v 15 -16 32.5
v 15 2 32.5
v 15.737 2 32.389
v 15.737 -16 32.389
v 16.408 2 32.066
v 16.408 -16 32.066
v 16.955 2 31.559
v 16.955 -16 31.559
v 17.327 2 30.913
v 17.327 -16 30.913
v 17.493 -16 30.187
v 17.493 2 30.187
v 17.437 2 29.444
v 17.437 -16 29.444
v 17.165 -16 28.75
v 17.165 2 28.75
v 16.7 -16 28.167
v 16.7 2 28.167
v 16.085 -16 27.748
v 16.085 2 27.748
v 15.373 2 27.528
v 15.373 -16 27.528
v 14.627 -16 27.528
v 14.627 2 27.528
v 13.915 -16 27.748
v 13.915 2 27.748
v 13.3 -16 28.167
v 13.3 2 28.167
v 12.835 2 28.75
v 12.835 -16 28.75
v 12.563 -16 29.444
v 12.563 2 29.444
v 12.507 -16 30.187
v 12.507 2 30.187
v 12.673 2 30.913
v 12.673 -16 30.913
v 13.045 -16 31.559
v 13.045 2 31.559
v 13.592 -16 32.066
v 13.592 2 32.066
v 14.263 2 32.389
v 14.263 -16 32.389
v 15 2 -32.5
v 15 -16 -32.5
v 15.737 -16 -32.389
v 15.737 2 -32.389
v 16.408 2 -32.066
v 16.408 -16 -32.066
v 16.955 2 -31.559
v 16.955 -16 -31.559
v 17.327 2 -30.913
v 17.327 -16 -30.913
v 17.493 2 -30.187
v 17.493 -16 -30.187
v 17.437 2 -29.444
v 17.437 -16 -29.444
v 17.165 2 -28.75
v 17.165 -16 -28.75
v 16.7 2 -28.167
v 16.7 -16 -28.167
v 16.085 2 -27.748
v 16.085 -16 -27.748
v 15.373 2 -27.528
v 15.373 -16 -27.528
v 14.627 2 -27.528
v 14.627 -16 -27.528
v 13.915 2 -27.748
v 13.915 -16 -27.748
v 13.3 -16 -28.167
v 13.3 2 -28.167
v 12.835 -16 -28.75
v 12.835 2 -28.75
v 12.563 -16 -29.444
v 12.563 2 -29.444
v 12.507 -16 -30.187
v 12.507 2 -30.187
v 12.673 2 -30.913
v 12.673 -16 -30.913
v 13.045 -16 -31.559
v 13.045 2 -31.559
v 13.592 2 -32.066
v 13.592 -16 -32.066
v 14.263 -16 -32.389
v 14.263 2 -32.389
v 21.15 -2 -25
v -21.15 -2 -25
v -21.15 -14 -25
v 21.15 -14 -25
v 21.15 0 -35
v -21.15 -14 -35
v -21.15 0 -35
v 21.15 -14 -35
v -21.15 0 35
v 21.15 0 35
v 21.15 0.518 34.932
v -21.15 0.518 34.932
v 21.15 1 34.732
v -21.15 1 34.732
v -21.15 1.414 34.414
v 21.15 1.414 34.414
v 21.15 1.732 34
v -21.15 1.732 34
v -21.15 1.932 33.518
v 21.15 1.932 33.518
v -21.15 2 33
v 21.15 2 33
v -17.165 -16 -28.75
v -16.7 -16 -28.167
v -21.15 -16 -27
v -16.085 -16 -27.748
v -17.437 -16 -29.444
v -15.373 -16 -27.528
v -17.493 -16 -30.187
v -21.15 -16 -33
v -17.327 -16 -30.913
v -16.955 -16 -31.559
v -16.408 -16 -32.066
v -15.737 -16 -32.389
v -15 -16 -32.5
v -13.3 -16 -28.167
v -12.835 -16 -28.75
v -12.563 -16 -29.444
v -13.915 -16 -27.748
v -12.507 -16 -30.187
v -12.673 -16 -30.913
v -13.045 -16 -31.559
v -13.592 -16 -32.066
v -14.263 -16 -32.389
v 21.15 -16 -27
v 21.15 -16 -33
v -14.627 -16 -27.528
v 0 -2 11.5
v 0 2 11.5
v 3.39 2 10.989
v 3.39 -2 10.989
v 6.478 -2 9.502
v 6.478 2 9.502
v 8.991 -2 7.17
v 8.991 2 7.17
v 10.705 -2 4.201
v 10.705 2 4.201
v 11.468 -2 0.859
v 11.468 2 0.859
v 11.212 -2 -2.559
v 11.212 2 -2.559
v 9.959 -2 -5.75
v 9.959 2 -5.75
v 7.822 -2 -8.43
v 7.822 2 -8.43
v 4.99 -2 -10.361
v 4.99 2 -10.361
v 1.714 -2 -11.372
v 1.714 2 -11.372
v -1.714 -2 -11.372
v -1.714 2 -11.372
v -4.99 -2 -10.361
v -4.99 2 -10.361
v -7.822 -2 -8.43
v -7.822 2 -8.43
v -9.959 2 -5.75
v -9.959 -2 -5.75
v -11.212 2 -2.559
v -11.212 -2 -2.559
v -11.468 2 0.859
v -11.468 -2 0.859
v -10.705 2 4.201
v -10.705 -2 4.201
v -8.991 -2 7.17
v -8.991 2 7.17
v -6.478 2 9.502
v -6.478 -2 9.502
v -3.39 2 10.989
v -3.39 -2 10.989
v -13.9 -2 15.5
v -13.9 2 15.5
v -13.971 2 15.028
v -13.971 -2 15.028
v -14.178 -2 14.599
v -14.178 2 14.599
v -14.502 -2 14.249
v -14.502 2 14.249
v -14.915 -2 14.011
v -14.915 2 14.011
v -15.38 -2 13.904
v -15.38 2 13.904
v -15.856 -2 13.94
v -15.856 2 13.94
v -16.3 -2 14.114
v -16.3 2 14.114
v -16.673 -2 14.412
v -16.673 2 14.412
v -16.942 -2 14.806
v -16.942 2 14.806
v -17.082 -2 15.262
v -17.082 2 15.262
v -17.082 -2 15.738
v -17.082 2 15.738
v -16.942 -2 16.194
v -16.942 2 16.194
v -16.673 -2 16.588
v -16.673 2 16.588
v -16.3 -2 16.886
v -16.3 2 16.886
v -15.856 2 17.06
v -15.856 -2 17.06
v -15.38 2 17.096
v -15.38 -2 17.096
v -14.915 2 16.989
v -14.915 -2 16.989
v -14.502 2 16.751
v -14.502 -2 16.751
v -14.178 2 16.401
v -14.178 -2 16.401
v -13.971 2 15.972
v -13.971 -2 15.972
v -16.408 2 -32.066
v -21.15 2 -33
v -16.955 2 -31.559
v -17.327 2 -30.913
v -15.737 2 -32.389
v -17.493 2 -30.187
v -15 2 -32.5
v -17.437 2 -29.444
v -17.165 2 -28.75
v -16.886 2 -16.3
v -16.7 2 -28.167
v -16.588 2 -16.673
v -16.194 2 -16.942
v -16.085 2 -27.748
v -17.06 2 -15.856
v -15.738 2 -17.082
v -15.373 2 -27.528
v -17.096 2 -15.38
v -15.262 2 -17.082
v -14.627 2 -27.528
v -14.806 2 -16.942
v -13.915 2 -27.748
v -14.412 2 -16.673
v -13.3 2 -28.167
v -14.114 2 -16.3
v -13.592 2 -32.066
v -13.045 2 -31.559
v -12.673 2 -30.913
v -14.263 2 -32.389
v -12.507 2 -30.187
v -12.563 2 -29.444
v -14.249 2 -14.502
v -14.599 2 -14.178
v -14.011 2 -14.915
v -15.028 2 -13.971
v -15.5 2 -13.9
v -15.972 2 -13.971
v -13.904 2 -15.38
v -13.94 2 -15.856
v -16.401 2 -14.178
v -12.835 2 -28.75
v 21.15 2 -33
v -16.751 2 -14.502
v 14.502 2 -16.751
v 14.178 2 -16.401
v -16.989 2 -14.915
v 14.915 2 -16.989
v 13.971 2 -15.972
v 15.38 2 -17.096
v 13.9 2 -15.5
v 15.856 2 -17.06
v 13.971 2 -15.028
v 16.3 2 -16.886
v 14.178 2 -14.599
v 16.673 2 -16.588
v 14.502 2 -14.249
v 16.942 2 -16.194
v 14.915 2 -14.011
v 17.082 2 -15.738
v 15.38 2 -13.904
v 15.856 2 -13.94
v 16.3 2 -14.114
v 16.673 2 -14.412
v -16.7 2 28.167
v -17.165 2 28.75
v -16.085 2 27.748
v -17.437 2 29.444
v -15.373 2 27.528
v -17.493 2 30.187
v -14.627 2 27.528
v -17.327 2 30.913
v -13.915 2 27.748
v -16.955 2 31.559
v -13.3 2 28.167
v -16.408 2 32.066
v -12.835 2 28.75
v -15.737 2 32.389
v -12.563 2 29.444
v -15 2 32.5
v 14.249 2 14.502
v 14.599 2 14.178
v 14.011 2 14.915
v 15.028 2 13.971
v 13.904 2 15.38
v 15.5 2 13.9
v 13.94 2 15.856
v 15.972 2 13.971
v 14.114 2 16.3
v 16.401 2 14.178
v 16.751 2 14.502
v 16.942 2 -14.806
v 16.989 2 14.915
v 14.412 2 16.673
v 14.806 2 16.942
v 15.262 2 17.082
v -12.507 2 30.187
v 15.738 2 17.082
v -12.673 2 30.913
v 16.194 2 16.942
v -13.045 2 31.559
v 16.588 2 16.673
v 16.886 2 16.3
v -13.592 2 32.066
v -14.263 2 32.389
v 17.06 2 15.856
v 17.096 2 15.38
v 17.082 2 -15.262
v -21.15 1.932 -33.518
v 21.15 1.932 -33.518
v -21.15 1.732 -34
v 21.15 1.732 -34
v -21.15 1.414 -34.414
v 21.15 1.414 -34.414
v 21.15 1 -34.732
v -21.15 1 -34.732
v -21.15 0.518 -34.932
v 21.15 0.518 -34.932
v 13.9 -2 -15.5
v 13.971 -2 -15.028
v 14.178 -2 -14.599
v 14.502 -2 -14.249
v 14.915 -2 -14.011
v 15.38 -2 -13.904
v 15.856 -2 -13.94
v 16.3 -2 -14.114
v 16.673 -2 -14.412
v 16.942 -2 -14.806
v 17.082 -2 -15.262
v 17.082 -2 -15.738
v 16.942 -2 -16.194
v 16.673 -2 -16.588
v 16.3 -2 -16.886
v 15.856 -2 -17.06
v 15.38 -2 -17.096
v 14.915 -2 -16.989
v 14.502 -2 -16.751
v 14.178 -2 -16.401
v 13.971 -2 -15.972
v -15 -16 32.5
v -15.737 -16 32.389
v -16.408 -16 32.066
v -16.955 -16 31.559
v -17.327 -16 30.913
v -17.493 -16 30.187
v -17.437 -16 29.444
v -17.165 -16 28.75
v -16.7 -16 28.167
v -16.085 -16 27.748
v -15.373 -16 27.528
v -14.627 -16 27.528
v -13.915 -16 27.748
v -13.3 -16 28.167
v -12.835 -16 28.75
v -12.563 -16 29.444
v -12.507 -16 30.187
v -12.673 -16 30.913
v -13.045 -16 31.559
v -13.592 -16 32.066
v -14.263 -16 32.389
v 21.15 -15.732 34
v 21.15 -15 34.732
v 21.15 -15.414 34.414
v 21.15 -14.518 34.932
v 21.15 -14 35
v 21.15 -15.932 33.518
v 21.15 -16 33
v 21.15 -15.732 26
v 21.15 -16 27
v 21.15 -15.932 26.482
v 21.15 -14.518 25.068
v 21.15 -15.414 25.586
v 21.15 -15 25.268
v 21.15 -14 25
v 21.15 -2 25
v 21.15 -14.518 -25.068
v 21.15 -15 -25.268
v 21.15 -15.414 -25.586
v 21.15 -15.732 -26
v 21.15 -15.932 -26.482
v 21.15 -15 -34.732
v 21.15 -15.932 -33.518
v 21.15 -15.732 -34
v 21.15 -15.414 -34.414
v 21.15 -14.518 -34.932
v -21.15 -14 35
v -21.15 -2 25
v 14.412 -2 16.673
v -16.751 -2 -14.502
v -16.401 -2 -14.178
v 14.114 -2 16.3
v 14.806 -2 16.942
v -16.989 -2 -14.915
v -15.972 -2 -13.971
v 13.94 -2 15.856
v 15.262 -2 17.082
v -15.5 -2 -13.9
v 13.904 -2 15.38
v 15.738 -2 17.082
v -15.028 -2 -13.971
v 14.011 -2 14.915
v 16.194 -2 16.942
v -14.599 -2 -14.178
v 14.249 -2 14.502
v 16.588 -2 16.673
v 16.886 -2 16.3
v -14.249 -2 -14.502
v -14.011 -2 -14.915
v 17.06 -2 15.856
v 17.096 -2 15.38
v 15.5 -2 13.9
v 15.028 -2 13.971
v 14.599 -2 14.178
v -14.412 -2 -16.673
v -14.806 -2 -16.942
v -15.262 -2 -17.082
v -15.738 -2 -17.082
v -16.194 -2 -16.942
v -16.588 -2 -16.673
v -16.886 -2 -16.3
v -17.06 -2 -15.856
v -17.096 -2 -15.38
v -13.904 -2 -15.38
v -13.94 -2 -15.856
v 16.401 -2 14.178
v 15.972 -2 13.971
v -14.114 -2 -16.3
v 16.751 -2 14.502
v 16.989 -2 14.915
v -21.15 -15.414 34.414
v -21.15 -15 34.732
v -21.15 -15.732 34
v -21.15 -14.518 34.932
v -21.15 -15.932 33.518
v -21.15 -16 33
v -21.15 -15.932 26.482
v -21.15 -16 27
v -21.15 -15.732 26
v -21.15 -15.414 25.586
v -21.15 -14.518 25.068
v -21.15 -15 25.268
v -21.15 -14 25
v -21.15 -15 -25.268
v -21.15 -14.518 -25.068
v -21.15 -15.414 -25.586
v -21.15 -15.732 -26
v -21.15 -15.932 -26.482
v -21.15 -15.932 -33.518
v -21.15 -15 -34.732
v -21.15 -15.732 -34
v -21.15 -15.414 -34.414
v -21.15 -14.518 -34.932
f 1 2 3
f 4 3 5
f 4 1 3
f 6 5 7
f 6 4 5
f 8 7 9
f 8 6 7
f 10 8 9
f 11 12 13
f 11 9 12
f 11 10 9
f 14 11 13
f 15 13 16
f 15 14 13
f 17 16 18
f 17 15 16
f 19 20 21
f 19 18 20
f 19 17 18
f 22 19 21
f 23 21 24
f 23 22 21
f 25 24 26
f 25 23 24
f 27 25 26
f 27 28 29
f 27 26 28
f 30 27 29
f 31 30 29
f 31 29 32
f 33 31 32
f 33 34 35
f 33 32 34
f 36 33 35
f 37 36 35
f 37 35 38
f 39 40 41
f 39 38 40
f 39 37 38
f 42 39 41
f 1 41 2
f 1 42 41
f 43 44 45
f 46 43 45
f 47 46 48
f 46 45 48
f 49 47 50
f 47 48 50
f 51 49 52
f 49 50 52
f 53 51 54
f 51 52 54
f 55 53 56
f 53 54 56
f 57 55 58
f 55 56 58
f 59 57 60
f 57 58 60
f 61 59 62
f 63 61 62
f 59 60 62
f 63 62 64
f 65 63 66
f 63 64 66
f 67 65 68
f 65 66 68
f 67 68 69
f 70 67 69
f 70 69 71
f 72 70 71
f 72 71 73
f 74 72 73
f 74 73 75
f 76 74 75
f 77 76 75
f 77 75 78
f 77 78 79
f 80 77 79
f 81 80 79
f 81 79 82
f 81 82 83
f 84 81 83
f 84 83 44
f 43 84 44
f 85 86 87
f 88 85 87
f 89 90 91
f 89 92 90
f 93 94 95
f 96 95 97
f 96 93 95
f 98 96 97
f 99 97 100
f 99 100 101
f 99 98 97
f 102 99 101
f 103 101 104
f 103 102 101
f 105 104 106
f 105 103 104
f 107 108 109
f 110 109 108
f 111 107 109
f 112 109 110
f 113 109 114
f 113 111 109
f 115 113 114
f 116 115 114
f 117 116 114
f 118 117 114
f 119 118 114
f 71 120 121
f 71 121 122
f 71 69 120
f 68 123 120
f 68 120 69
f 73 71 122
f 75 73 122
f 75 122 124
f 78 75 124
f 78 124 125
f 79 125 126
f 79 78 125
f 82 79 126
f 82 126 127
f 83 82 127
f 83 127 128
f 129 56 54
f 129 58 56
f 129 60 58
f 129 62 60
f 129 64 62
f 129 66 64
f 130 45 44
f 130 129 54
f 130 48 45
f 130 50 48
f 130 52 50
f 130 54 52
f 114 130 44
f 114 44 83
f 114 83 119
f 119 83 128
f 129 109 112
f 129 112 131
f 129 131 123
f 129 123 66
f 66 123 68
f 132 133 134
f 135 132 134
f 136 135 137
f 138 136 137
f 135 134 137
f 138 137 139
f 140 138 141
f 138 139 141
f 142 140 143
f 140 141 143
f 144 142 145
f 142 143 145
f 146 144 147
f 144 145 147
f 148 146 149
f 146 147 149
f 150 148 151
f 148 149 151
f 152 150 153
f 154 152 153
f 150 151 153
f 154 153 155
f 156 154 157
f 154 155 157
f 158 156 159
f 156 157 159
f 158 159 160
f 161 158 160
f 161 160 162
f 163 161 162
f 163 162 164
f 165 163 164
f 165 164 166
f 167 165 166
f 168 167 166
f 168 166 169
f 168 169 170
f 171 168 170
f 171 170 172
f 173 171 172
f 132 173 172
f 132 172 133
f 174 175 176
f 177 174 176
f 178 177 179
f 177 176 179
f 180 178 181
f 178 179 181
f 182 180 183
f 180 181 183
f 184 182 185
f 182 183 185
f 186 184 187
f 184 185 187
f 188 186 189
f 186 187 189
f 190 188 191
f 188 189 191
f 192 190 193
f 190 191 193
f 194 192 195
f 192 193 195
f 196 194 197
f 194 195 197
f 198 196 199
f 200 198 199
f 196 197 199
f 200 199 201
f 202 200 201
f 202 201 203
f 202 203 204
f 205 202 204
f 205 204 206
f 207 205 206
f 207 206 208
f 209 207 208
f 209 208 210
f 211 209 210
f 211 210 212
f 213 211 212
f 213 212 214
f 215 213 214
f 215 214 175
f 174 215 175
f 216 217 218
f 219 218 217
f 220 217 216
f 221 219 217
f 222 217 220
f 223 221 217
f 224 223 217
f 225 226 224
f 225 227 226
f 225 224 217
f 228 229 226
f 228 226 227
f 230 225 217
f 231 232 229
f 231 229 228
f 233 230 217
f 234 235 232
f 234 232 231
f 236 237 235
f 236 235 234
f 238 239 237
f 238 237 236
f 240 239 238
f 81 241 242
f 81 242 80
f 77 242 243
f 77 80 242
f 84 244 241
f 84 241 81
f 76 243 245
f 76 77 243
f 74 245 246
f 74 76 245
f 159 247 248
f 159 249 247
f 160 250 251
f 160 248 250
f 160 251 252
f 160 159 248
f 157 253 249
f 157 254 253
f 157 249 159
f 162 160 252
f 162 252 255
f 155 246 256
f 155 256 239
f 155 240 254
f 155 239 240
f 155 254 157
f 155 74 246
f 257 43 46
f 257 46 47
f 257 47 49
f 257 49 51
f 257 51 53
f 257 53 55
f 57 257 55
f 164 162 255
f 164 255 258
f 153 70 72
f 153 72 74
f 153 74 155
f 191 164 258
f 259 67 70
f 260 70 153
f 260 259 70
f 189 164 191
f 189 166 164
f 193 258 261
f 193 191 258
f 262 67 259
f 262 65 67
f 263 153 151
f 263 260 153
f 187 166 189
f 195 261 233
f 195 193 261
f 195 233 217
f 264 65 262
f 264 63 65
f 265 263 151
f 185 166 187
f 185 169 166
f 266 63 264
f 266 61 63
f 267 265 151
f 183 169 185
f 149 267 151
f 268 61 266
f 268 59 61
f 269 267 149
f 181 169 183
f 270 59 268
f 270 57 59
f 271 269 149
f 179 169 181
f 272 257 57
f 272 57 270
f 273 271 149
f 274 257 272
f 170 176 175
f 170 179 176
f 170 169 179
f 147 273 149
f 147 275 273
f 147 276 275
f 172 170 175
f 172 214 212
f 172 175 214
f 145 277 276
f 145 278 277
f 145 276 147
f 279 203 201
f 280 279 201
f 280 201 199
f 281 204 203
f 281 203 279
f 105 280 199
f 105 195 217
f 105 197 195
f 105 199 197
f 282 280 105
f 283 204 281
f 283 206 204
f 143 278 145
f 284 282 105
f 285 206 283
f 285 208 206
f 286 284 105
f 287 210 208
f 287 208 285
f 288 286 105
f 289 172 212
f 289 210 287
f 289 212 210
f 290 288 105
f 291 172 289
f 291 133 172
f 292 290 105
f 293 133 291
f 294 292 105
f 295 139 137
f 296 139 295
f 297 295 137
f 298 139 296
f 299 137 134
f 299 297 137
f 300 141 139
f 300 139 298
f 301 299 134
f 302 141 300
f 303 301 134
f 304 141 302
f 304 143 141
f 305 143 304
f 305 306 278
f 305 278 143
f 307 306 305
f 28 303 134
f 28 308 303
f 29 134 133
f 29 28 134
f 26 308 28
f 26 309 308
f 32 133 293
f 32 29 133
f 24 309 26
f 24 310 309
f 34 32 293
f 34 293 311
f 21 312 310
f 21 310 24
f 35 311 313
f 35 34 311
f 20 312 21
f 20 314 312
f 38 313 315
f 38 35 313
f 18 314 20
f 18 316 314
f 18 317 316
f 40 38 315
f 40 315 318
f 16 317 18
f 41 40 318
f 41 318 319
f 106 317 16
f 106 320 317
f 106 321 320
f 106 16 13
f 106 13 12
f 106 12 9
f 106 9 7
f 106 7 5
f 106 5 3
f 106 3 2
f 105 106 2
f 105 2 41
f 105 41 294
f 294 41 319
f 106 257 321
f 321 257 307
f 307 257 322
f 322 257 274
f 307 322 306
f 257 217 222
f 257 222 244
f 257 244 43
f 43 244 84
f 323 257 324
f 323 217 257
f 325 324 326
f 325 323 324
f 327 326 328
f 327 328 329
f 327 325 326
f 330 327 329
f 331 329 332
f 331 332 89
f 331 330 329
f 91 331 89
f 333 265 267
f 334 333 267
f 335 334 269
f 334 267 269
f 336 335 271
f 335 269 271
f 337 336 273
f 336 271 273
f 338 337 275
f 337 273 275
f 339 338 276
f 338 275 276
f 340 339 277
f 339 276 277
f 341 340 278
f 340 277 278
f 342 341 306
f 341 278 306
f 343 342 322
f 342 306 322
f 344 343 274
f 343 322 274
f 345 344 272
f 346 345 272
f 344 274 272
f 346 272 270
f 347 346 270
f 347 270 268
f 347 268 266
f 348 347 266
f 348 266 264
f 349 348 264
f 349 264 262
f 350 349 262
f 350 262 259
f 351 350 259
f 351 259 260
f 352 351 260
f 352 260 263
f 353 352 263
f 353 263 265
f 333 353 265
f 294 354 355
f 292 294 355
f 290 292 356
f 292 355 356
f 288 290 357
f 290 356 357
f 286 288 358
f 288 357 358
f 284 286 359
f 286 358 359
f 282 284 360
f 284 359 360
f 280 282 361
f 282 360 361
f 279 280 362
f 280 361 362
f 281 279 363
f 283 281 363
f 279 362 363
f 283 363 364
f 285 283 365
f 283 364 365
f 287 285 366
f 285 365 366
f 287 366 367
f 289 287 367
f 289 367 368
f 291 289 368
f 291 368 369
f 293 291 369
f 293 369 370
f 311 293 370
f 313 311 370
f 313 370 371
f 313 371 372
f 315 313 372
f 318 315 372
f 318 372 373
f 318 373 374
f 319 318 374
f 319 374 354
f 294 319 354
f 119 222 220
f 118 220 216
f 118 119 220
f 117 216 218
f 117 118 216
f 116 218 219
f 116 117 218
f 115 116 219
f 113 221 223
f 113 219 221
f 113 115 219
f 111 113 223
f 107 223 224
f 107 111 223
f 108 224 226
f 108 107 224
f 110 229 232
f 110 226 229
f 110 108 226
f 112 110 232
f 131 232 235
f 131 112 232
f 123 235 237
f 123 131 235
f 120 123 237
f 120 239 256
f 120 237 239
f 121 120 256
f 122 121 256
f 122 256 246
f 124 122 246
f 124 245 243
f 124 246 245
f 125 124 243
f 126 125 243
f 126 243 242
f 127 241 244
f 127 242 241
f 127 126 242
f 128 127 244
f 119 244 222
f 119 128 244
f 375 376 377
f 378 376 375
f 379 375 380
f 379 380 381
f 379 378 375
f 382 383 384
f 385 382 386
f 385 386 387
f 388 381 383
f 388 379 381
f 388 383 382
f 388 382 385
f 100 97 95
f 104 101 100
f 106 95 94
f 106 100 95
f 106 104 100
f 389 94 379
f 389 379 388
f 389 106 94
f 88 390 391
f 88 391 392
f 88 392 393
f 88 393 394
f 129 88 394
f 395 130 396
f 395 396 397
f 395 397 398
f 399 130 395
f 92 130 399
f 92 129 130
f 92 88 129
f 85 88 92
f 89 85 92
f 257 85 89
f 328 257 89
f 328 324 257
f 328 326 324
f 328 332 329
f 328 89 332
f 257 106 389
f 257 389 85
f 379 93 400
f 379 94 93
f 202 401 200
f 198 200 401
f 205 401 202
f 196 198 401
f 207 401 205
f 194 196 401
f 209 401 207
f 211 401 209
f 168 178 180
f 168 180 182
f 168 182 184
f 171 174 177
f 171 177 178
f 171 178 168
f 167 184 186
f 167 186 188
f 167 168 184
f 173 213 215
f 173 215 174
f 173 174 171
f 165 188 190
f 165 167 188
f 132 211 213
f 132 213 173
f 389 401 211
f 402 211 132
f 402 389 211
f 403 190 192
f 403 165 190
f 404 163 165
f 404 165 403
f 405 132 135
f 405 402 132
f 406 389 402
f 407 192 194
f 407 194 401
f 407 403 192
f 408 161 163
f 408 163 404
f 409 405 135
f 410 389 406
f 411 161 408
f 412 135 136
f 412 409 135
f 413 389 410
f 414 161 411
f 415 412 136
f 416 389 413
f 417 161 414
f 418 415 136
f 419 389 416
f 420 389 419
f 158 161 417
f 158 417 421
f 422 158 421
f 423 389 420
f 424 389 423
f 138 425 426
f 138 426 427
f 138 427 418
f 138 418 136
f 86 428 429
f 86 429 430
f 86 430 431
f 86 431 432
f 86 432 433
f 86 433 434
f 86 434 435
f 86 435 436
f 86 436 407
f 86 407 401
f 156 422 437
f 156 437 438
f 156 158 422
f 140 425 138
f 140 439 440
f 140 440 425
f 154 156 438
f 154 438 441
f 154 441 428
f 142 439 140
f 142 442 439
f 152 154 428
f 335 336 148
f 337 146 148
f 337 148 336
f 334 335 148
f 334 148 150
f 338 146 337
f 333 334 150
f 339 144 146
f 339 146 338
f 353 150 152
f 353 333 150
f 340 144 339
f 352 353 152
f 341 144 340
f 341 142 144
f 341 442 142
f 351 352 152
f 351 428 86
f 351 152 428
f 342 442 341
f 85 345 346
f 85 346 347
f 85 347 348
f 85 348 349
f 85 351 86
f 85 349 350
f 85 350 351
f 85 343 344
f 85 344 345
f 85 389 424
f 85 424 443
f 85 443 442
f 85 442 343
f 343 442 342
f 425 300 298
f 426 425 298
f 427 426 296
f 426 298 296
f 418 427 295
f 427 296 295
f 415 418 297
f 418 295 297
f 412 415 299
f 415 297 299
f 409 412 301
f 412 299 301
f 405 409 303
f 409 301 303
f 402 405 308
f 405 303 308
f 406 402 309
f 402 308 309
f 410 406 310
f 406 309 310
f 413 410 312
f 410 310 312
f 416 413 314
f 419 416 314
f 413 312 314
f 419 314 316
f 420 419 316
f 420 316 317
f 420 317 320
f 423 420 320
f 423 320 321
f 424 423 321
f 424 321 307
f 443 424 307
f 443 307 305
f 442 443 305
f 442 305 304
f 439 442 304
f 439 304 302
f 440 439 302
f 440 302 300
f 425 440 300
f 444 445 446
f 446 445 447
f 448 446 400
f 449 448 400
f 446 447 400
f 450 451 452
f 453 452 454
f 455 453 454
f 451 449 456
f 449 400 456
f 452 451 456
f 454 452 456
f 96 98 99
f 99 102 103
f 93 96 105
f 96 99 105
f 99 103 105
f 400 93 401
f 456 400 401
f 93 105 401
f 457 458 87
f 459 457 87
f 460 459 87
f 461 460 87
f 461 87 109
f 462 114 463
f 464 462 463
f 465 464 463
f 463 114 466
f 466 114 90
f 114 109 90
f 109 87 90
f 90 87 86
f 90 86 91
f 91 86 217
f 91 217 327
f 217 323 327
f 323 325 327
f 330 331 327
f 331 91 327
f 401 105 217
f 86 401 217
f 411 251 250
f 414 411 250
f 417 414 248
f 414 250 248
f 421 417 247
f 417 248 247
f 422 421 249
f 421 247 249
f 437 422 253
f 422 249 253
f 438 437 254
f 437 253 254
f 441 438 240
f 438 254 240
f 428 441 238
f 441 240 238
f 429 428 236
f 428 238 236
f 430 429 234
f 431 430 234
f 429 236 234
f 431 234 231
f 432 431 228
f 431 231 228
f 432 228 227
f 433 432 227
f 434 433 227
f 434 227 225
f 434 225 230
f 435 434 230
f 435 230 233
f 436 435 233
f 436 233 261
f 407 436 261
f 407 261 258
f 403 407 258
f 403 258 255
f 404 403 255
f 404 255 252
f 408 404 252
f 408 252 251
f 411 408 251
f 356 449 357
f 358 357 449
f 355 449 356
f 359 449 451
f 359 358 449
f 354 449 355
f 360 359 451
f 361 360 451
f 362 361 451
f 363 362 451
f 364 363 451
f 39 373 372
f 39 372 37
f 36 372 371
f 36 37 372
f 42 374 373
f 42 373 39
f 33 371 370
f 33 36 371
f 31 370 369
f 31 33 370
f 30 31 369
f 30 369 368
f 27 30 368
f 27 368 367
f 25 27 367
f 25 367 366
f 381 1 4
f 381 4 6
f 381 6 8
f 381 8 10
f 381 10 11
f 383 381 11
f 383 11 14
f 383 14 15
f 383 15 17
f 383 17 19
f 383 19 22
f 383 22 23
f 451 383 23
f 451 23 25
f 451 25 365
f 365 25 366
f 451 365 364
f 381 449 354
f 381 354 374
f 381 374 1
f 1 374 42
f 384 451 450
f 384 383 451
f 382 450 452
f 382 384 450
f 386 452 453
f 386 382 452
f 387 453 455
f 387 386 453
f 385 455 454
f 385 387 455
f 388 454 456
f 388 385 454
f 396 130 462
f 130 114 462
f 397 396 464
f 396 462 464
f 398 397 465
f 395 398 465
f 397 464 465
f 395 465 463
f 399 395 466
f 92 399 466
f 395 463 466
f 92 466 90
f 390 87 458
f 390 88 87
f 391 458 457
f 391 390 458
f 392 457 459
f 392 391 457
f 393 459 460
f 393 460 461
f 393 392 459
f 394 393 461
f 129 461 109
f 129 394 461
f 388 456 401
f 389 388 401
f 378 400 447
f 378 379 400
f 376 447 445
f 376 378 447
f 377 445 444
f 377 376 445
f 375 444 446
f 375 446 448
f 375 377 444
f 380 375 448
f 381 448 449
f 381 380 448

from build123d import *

# Parameters (mm, degrees)
ESBO_O1_W                 = 50
ESBO_O1_H                 = 4
RESSALTO_EXTRUS_O1_DEPTH  = 21.15
ESBO_O3_R                 = 11.5
CORTE_EXTRUS_O1_DEPTH     = 45.680224932
ESBO_O4_R                 = 1.6
CORTE_EXTRUS_O2_DEPTH     = 45.680224932
PADR_OCIRCULAR1_COUNT     = 4
ESBO_O5_R                 = 2.5
CORTE_EXTRUS_O3_DEPTH     = 45.680224932
ESPELHAR2_COPY_1_SKETCH_R = 2.5
ESPELHAR2_COPY_1_DEPTH    = 45.680224932
FILETE1_R                 = 2


with BuildPart() as part:
    # Esboço1 → Ressalto-extrusão1 (new, symmetric)
    with BuildSketch(Plane(origin=(0, 0, 0), x_dir=(0, 0, -1), z_dir=(1, 0, 0))):
        Polygon((-25, -2), (-25, 2), (-35, 2), (-35, -16), (-25, -16), align=None)
        Rectangle(ESBO_O1_W, ESBO_O1_H)
        Polygon((35, 2), (25, 2), (25, -2), (25, -16), (35, -16), align=None)
    extrude(amount=RESSALTO_EXTRUS_O1_DEPTH, both=True)

    # Esboço3 → Corte-extrusão1 (cut, through all)
    with BuildSketch(Plane(origin=(0, 2, 0), x_dir=(1, 0, 0), z_dir=(0, 1, 0))):
        with Locations(Location((0, 0, 0), (0, 0, 270))):
            Circle(ESBO_O3_R)
    extrude(amount=-CORTE_EXTRUS_O1_DEPTH, mode=Mode.SUBTRACT)

    # Esboço4 → Corte-extrusão2 (cut, through all)
    with BuildSketch(Plane(origin=(0, 2, 0), x_dir=(1, 0, 0), z_dir=(0, 1, 0))):
        with Locations(Location((-15.5, 15.5, 0), (0, 0, 270))):
            Circle(ESBO_O4_R)
    corte_extrus_o2 = extrude(amount=-CORTE_EXTRUS_O2_DEPTH, mode=Mode.SUBTRACT)

    # PadrãoCircular1: Corte-extrusão2 ×4 about axis
    padr_ocircular1_axis = Axis((0, 0, 0), (0, 1, 0))
    for i in range(1, PADR_OCIRCULAR1_COUNT):
        add(corte_extrus_o2.rotate(padr_ocircular1_axis, i * 360 / PADR_OCIRCULAR1_COUNT), mode=Mode.SUBTRACT)

    # Esboço5 → Corte-extrusão3 (cut, through all)
    with BuildSketch(Plane.XZ.offset(16)):
        with Locations(Location((15, -30, 0), (0, 0, 270))):
            Circle(ESBO_O5_R)
    corte_extrus_o3 = extrude(amount=-CORTE_EXTRUS_O3_DEPTH, mode=Mode.SUBTRACT)

    # Espelhar1: Corte-extrusão3 across plane
    add(corte_extrus_o3.mirror(Plane(origin=(0, 0, 0), x_dir=(0, 0, 1), z_dir=(1, 0, 0))), mode=Mode.SUBTRACT)

    # Espelhar2: Corte-extrusão3 across plane
    add(corte_extrus_o3.mirror(Plane.XY), mode=Mode.SUBTRACT)

    # Espelhar2 copy 1 sketch → Espelhar2 copy 1 (cut, through all)
    with BuildSketch(Plane(origin=(0, -16, 0), x_dir=(-1, 0, 0), z_dir=(0, -1, 0))):
        with Locations(Location((15, -30, 0), (0, 0, 270))):
            Circle(ESPELHAR2_COPY_1_SKETCH_R)
    extrude(amount=-ESPELHAR2_COPY_1_DEPTH, mode=Mode.SUBTRACT)

    # Filete1
    filete1_edges = [part.edges().sort_by_distance(p)[0] for p in [
        (0, 2, -35),
        (0, -16, -35),
        (0, -16, -25),
        (0, -16, 25),
        (0, -16, 35),
        (0, 2, 35),
    ]]
    fillet(filete1_edges, radius=FILETE1_R)


solid = part.part
